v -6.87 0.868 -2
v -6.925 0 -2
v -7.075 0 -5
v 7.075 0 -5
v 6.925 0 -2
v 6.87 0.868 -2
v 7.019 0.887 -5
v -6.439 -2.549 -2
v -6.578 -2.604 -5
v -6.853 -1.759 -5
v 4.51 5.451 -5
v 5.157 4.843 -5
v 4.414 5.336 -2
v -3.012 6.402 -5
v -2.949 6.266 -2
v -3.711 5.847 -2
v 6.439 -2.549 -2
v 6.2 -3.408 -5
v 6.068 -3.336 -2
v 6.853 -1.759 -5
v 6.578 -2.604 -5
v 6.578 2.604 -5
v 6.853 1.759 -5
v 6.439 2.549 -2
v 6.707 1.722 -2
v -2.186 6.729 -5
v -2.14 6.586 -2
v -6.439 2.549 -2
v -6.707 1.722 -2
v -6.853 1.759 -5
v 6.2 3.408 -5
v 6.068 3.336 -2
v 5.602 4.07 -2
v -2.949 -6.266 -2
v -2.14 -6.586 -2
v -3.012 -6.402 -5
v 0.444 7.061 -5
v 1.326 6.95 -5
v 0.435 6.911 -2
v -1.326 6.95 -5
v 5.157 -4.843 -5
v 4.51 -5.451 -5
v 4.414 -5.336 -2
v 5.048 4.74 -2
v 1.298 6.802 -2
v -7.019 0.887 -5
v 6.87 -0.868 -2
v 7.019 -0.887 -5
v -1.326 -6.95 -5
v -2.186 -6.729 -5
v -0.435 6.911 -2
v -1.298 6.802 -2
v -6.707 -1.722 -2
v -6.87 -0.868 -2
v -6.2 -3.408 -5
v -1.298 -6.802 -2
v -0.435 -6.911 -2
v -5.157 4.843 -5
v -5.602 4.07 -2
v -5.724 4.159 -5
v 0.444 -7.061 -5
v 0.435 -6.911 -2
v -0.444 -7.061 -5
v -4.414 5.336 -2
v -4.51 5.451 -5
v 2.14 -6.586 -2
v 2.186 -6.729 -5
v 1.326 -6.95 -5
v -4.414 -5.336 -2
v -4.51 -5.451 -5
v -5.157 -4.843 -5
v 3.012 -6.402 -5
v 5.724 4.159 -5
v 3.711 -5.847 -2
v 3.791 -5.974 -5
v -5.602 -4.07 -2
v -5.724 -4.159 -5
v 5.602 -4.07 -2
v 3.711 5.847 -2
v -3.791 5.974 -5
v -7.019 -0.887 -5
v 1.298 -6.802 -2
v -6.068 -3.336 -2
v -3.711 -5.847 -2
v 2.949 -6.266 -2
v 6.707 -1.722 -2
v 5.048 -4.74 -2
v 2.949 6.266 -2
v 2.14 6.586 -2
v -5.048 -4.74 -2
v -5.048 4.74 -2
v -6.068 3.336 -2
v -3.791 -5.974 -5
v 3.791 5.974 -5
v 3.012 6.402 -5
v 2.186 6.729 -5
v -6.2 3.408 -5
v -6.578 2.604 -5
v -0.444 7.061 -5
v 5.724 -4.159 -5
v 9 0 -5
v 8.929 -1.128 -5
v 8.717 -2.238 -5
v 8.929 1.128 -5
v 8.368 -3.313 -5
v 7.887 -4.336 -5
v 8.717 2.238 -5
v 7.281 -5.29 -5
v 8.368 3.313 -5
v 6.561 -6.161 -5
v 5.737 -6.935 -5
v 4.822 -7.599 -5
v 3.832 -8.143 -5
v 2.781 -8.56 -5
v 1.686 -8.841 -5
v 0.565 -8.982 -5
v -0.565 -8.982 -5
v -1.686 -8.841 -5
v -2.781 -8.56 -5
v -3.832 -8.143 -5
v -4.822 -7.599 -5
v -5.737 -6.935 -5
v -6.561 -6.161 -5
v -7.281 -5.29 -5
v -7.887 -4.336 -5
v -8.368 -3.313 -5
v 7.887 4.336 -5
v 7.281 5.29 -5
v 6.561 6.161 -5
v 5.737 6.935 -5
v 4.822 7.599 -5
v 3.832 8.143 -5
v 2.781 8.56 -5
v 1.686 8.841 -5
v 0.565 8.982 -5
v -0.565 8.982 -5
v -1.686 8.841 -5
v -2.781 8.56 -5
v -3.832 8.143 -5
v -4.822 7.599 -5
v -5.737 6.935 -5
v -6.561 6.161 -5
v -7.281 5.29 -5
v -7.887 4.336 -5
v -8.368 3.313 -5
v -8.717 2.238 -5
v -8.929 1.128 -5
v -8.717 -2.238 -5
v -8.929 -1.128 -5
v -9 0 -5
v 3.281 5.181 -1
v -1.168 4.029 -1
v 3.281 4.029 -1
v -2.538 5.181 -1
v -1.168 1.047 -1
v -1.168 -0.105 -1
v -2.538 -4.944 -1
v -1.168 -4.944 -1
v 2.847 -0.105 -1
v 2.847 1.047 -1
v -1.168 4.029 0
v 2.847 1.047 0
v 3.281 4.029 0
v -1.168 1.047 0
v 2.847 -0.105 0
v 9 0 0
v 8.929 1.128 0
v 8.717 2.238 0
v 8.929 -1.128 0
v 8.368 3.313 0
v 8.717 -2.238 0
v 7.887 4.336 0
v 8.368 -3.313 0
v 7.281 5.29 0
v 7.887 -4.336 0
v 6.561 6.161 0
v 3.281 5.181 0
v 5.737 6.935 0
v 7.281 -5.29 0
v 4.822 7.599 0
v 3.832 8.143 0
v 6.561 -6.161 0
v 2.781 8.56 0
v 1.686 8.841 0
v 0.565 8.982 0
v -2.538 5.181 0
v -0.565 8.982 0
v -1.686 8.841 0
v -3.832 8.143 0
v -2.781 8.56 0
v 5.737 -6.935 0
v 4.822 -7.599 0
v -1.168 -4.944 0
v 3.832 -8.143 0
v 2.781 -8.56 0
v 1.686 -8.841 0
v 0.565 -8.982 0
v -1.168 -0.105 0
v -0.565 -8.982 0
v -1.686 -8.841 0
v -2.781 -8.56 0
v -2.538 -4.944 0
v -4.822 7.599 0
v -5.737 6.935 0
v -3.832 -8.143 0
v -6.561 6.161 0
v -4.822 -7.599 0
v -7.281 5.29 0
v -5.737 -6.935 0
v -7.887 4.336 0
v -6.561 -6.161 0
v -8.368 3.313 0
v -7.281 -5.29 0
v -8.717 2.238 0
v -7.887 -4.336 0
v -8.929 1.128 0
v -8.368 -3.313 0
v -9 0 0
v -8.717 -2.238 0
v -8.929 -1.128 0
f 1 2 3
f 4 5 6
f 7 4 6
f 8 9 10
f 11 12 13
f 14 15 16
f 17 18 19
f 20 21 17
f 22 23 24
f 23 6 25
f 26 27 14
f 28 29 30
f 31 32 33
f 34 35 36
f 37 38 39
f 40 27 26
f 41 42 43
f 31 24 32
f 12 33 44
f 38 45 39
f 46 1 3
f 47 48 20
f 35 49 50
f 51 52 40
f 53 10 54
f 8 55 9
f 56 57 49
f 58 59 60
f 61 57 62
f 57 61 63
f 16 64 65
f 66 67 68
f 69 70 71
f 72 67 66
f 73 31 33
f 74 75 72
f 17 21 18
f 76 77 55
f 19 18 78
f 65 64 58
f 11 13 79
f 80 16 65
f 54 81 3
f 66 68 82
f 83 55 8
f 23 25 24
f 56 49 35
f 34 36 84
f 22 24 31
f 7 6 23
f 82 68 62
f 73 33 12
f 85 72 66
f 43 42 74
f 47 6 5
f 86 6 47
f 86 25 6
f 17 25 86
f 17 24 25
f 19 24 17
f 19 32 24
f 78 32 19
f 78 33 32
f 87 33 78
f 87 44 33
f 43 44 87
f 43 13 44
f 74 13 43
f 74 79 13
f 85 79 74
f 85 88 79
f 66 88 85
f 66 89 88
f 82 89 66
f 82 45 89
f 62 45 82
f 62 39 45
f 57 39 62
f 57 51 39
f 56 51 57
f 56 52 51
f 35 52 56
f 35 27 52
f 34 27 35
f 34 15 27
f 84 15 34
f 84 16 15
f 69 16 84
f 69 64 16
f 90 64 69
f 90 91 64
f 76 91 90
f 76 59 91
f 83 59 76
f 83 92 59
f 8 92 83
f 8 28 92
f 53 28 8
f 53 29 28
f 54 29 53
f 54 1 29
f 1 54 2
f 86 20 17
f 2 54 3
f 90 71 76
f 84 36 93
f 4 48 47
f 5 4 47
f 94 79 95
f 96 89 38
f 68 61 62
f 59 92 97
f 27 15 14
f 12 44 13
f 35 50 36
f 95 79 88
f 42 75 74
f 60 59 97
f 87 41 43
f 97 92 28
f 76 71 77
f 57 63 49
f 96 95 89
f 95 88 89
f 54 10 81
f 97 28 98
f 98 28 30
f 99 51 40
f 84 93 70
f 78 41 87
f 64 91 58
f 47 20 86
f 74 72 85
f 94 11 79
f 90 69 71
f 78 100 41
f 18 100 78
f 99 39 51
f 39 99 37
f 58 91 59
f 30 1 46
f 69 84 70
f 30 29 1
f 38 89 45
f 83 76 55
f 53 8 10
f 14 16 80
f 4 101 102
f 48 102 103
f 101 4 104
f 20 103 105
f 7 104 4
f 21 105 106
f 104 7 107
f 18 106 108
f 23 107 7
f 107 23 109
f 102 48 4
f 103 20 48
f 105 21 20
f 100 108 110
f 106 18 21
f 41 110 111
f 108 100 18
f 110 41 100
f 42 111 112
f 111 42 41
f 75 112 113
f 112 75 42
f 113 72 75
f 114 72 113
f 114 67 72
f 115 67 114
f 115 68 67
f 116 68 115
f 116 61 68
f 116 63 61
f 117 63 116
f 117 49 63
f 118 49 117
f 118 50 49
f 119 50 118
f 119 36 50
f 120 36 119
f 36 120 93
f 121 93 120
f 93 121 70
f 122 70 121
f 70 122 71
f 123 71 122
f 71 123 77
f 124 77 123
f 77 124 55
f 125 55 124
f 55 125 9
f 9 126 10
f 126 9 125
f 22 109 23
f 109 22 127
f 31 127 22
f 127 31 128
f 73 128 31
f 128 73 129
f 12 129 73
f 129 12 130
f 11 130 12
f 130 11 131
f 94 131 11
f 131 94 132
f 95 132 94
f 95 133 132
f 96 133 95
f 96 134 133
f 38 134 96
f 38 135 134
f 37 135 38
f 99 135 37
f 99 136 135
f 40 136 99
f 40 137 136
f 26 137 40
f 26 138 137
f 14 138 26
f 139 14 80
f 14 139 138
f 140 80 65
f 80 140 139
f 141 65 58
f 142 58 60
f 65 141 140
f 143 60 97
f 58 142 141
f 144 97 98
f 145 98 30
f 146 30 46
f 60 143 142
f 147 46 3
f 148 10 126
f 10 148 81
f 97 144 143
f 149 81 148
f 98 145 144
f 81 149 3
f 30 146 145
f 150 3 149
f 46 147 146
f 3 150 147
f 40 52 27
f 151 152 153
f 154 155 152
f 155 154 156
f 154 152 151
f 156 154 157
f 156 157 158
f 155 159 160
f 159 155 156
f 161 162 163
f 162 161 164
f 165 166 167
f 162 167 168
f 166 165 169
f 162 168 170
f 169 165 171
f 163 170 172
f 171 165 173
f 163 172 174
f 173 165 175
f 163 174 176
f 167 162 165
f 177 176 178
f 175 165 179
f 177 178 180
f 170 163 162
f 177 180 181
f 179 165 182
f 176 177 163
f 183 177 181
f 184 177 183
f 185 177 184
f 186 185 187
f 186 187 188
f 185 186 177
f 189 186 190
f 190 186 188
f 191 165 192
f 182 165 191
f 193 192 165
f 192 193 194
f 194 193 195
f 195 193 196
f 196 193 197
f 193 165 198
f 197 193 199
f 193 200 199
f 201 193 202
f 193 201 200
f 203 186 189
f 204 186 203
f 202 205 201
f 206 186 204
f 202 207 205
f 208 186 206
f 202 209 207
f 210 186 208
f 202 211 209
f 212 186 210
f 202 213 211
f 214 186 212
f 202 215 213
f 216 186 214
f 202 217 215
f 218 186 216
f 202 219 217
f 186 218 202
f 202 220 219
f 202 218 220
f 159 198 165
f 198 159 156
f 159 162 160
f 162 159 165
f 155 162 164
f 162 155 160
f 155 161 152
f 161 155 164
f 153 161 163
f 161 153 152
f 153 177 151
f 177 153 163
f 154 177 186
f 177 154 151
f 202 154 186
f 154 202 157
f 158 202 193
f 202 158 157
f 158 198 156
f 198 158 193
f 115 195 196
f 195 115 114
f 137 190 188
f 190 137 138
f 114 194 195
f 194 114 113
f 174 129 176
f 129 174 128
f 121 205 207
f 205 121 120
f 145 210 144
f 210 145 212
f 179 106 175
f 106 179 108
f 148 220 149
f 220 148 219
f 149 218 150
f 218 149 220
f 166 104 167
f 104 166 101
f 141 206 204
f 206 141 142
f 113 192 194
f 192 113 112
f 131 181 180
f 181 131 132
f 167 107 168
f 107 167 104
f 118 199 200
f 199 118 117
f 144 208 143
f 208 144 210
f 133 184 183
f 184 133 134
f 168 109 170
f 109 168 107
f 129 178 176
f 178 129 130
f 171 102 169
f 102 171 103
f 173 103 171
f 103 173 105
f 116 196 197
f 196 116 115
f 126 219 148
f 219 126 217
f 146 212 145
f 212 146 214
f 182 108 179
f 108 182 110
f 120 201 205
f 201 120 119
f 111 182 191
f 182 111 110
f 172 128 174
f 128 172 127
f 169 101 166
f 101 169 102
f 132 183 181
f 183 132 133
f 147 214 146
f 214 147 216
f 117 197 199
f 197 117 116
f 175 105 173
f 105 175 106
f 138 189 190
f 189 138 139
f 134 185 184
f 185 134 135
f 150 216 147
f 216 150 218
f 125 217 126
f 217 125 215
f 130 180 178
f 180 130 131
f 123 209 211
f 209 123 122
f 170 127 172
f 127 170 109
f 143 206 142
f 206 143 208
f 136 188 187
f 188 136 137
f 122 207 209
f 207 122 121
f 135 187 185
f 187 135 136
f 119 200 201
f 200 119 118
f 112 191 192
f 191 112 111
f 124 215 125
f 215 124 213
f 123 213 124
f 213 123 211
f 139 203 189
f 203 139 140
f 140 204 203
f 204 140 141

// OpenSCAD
$fn = 50;

difference() {
	union() {
		translate(v = [0, 0, -5.0]) {
			cylinder(h = 5, r = 9.0);
		}
	}
	union() {
		#translate(v = [0, 0, -5.0]) {
			cylinder(h = 3, r1 = 7.075, r2 = 6.925);
		}
		translate(v = [0, 0, -1]) {
			linear_extrude(height = 1) {
				text(font = "Impact", halign = "center", size = 10, text = "F", valign = "center");
			}
		}
	}
}
